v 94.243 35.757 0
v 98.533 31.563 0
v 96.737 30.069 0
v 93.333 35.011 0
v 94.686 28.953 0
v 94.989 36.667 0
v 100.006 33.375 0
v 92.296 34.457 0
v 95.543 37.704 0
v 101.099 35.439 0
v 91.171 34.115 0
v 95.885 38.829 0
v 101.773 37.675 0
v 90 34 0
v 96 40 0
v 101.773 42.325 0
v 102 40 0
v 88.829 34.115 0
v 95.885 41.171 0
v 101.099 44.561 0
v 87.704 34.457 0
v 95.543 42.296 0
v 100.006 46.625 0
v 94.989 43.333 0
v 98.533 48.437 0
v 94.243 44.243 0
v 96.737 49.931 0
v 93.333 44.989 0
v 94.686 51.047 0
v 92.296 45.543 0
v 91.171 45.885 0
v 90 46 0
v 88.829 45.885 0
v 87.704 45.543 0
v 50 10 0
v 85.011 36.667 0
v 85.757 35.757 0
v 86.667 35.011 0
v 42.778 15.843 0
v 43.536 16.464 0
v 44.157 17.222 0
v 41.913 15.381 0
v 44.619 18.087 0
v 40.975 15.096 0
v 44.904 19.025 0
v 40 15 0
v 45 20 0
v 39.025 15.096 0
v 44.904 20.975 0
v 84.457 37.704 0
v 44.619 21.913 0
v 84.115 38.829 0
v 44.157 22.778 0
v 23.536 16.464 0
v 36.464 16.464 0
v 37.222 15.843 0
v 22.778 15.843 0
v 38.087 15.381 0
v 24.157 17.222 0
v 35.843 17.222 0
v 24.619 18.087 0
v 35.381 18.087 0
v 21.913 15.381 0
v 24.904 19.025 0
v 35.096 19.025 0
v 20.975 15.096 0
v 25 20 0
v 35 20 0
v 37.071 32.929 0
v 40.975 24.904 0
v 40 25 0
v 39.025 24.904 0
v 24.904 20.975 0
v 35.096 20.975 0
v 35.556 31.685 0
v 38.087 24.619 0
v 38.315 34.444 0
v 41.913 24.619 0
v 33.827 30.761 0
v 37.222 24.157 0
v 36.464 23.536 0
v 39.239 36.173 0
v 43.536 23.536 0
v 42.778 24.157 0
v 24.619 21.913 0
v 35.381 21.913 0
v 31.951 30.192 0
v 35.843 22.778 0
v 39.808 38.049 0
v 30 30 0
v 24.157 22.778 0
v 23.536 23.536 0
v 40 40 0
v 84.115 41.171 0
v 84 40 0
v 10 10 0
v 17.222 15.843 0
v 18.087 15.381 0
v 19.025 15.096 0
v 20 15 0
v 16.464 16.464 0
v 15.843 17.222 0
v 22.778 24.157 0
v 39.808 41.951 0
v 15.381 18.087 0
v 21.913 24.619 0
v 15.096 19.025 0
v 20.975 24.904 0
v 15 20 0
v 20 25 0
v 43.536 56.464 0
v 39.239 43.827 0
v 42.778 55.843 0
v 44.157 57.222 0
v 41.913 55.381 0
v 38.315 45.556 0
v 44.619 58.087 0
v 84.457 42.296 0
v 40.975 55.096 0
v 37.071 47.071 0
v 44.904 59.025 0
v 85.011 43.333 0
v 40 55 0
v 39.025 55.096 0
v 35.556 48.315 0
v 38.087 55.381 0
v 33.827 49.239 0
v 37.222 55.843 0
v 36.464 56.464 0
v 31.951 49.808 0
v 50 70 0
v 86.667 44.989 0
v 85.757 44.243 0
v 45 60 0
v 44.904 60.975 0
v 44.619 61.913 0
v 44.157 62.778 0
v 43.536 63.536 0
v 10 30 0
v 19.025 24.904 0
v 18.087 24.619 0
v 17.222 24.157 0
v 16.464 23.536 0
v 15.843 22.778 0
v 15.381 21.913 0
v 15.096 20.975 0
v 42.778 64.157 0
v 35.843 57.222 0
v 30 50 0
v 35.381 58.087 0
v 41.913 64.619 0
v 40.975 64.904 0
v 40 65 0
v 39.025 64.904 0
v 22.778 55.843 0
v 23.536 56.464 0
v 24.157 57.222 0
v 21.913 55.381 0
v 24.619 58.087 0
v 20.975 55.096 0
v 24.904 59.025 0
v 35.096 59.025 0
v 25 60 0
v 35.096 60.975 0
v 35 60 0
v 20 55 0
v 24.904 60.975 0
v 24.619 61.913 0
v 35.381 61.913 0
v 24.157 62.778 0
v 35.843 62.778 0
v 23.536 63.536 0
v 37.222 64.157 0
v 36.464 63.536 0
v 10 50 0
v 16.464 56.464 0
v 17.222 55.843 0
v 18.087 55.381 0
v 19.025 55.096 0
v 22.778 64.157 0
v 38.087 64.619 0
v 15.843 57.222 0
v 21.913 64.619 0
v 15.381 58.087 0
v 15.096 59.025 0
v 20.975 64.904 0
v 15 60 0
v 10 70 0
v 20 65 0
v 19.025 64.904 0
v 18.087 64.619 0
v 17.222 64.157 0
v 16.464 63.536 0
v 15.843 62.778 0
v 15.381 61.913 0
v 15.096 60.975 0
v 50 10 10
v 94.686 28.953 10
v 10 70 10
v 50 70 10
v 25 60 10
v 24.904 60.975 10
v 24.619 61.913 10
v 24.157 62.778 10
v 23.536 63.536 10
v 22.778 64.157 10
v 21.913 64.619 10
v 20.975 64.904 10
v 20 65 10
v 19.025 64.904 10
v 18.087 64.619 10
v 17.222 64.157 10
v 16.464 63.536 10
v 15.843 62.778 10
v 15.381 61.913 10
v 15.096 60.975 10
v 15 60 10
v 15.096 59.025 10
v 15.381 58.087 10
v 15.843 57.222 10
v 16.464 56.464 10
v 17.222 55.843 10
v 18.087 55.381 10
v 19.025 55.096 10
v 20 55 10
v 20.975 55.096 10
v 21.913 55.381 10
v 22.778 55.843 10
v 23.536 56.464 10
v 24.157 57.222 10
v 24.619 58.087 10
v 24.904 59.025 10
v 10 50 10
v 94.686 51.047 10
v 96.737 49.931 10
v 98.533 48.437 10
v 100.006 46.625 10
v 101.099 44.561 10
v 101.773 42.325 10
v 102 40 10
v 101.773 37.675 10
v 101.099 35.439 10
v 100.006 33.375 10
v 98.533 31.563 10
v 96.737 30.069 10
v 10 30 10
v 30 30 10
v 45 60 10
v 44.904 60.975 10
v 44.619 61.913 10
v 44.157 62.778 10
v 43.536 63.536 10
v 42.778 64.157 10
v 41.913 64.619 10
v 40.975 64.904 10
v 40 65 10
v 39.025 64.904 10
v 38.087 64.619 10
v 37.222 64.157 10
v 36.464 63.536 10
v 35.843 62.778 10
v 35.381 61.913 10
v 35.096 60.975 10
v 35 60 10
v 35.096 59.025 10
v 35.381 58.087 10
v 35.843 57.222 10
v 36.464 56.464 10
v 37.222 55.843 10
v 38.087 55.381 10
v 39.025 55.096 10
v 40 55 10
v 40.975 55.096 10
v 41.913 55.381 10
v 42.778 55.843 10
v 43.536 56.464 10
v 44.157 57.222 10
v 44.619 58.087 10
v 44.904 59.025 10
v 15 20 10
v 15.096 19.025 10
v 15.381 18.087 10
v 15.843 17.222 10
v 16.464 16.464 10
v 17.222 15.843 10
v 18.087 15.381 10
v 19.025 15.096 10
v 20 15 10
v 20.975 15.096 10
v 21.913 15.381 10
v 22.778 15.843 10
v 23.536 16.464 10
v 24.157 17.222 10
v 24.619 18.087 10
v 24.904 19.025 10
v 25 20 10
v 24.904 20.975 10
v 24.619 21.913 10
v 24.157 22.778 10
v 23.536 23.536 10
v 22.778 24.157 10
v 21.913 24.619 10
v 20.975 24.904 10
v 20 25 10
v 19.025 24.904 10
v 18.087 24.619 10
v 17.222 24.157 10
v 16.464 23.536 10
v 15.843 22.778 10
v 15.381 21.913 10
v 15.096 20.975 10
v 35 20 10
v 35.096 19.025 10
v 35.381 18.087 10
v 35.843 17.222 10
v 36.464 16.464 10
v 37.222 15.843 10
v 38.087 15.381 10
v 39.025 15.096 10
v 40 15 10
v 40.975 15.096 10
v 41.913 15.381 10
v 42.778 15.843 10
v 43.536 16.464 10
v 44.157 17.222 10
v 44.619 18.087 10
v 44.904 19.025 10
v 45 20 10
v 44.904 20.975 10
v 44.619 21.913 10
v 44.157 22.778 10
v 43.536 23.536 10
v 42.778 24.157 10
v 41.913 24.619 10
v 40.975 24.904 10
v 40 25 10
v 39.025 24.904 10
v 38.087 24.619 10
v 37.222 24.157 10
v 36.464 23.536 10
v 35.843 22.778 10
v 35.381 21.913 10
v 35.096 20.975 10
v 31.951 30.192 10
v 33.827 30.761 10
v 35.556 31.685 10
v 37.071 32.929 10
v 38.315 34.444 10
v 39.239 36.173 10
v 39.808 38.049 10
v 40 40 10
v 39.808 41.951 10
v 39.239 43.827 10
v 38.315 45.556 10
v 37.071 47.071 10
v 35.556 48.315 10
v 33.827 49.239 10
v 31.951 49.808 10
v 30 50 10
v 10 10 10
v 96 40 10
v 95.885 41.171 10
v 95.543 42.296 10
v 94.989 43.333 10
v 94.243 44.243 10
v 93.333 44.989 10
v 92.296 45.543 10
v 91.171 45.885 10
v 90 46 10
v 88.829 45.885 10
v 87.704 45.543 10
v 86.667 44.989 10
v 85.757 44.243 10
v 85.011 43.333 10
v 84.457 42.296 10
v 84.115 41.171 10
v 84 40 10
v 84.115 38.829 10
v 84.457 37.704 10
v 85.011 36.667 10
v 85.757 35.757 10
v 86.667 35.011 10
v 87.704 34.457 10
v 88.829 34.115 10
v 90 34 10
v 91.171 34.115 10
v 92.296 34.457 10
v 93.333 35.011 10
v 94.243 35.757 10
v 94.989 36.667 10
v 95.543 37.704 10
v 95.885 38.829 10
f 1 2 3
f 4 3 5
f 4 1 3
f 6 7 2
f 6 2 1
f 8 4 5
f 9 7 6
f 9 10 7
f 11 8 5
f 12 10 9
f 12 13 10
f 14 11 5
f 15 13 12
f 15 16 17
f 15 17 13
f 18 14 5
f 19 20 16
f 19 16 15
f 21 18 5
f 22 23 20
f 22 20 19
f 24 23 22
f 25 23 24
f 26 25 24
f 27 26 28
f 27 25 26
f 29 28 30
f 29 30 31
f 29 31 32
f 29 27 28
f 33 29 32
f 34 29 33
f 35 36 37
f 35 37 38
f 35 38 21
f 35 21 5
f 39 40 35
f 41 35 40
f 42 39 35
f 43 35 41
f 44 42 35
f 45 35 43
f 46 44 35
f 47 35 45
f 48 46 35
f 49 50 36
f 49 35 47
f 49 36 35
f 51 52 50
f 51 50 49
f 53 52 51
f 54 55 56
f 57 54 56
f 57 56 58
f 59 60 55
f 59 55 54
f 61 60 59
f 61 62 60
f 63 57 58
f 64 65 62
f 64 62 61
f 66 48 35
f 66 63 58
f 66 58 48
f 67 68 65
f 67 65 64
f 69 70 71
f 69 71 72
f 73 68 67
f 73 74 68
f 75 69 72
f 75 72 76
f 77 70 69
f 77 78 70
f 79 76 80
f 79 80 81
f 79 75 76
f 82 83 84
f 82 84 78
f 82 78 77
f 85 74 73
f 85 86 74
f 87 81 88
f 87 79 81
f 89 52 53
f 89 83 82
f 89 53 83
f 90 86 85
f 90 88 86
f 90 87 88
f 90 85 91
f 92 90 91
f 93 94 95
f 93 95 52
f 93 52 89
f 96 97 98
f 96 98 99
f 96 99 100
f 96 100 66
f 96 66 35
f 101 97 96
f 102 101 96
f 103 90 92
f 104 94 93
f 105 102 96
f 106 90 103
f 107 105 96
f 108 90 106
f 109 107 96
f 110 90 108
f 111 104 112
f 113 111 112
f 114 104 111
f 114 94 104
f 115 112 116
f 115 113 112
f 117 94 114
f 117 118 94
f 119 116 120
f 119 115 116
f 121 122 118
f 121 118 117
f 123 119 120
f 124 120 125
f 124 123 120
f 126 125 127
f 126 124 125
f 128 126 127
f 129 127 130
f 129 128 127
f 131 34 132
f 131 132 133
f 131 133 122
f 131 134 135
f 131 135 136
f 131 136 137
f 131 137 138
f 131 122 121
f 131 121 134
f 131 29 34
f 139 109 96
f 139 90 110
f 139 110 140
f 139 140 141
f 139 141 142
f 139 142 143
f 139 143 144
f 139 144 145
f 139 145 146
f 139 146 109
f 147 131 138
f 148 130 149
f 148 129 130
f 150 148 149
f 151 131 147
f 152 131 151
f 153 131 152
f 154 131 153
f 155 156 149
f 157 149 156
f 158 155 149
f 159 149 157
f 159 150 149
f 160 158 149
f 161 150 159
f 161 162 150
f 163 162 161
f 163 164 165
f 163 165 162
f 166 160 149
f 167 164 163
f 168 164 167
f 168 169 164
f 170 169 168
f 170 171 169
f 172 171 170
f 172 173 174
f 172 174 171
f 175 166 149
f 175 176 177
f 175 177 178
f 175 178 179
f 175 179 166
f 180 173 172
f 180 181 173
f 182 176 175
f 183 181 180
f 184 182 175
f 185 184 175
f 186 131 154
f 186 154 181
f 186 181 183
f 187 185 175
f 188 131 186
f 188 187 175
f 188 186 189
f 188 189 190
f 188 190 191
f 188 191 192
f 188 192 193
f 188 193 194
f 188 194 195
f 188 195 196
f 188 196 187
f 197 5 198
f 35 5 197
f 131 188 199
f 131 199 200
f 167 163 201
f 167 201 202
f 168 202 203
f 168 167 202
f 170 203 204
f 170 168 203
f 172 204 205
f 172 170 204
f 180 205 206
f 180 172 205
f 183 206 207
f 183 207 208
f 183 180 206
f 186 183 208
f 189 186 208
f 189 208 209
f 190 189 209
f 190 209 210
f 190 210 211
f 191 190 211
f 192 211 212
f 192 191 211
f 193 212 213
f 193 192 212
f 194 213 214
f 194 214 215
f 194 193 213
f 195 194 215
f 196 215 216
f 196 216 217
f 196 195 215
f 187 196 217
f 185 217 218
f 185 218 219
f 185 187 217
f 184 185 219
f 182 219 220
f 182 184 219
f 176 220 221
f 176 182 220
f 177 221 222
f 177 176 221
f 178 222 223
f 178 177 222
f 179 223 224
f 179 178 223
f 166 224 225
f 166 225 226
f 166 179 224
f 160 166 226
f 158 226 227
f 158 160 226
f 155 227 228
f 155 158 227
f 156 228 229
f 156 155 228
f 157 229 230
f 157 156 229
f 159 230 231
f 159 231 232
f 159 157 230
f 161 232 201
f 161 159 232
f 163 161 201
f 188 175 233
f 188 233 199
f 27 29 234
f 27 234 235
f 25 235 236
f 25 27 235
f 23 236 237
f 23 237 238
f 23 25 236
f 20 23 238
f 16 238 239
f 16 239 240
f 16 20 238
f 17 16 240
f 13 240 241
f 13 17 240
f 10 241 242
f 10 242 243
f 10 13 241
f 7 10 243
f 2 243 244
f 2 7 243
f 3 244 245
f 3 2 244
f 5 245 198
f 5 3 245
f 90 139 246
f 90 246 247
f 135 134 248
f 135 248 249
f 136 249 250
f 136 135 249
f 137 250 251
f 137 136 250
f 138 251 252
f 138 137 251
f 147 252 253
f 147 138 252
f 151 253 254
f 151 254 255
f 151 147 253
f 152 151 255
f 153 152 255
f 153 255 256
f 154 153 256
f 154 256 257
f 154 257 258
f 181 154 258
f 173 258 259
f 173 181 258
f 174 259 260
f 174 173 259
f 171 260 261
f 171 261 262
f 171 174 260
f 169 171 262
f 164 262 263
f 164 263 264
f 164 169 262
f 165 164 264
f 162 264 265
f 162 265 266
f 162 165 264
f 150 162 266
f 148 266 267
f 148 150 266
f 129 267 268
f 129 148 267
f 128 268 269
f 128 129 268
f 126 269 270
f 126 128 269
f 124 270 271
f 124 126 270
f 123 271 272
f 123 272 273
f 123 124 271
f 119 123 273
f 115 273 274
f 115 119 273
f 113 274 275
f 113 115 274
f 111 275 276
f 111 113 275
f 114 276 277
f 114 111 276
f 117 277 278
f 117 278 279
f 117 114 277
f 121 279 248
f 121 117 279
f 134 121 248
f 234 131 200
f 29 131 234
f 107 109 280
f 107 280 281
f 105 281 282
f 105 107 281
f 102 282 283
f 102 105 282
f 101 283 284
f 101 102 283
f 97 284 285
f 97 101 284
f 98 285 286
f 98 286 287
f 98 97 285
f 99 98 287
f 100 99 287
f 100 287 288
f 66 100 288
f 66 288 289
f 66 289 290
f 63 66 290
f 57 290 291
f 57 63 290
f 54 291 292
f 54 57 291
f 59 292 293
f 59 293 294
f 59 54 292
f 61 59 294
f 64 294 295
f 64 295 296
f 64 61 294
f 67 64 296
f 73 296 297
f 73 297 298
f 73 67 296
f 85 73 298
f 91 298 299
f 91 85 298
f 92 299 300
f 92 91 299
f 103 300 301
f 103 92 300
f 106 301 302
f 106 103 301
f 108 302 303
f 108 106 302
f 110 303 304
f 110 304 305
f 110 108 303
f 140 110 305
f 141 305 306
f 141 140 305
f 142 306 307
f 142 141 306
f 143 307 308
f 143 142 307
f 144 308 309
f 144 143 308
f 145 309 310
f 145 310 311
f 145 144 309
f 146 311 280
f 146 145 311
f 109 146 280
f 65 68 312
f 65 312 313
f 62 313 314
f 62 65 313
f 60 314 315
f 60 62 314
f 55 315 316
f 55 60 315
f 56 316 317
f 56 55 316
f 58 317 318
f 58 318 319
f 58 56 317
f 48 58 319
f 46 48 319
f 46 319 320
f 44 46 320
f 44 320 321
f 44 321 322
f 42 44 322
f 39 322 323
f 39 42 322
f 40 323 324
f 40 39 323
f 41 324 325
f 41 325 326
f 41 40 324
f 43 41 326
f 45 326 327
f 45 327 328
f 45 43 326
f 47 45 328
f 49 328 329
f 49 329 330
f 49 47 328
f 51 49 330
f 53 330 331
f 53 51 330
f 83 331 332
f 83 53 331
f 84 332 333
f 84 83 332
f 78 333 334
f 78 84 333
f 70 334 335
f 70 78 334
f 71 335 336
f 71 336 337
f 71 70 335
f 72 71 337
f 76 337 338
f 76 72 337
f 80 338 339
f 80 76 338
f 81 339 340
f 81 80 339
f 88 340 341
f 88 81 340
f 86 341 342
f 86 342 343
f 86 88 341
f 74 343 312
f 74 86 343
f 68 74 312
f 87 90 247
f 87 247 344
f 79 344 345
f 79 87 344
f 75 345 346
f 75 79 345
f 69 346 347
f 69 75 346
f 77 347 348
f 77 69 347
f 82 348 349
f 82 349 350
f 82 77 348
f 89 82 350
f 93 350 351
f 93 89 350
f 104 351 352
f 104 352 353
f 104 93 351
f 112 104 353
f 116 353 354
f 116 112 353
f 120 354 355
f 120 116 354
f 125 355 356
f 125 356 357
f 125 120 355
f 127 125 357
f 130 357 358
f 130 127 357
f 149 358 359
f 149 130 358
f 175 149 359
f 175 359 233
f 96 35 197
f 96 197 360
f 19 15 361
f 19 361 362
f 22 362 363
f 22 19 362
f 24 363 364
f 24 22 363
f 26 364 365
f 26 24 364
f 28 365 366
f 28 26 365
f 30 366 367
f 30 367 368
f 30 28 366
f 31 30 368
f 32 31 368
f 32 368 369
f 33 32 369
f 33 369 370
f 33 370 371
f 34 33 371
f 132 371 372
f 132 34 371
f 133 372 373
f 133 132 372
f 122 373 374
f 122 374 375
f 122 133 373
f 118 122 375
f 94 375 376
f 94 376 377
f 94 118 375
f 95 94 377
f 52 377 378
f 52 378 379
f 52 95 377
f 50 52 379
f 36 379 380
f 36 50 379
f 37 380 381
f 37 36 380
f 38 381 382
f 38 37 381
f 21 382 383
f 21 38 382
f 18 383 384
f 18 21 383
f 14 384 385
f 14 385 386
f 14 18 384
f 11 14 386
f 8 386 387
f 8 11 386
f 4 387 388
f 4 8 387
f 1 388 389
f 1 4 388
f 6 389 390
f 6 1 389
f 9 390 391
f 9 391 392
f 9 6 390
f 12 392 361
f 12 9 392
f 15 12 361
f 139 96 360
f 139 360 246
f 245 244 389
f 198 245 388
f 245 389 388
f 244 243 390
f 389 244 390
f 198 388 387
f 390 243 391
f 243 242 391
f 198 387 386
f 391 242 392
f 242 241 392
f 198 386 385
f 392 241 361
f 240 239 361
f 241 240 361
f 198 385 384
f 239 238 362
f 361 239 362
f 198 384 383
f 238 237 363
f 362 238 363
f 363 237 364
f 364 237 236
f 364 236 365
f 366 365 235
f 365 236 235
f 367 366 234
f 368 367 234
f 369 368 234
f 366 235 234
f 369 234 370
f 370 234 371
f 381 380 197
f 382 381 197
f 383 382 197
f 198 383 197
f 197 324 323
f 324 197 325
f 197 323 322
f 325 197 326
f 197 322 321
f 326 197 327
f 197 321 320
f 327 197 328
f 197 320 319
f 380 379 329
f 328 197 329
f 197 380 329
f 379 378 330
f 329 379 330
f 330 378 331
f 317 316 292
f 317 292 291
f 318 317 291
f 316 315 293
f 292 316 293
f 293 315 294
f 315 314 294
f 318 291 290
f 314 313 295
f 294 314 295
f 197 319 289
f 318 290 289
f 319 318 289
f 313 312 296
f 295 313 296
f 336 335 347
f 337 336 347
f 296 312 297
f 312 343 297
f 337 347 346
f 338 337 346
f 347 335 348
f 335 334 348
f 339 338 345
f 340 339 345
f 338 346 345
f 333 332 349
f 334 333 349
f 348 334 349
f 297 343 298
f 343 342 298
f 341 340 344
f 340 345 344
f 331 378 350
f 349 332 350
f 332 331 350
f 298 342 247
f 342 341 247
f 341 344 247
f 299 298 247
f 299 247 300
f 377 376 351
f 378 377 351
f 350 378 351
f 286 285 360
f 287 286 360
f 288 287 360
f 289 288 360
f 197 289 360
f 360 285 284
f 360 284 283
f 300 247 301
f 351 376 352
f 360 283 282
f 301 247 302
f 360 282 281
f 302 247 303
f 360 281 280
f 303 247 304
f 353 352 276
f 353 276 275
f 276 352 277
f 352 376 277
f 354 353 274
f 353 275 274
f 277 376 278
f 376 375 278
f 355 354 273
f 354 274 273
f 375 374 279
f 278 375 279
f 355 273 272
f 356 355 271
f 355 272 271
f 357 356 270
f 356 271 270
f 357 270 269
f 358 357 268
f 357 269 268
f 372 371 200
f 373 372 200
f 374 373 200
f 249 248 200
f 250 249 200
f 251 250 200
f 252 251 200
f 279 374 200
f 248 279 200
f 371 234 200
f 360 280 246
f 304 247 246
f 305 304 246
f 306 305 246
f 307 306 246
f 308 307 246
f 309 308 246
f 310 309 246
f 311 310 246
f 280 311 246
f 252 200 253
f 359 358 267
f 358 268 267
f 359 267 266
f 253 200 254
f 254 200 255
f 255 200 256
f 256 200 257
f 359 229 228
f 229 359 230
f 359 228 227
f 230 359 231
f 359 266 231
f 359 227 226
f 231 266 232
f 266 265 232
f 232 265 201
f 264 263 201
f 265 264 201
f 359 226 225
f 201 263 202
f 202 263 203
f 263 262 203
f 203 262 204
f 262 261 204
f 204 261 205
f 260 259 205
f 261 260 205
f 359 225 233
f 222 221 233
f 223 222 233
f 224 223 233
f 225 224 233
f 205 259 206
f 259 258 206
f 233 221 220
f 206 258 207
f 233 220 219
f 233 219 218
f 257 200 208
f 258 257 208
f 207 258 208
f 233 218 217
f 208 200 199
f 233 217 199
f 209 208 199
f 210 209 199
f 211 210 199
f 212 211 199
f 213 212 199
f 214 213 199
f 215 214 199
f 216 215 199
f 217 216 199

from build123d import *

# Parameters (mm, degrees)
SKETCH1_R           = 6
SKETCH1_R_2         = 5
BOSS_EXTRUDE1_DEPTH = 10


with BuildPart() as part:
    # Sketch1 → Boss-Extrude1 (new body)
    with BuildSketch(Plane.XY):
        with BuildLine():
            Line((10, 70), (50, 70))
            Line((50, 70), (94.685564793, 51.047419724))
            ThreePointArc((94.685564793, 51.047419724), (102, 40), (94.685564793, 28.952580276))
            Line((94.685564793, 28.952580276), (50, 10))
            Line((50, 10), (10, 10))
            Line((10, 10), (10, 30))
            Line((10, 30), (30, 30))
            ThreePointArc((30, 30), (40, 40), (30, 50))
            Line((30, 50), (10, 50))
            Line((10, 50), (10, 70))
        make_face()
        with Locations((90, 40)):
            Circle(SKETCH1_R, mode=Mode.SUBTRACT)
        with Locations((20, 60)):
            Circle(SKETCH1_R_2, mode=Mode.SUBTRACT)
        with Locations((40, 60)):
            Circle(SKETCH1_R_2, mode=Mode.SUBTRACT)
        with Locations(Location((40, 20, 0), (0, 0, 180))):
            Circle(SKETCH1_R_2, mode=Mode.SUBTRACT)
        with Locations(Location((20, 20, 0), (0, 0, 180))):
            Circle(SKETCH1_R_2, mode=Mode.SUBTRACT)
    extrude(amount=BOSS_EXTRUDE1_DEPTH)


solid = part.part
